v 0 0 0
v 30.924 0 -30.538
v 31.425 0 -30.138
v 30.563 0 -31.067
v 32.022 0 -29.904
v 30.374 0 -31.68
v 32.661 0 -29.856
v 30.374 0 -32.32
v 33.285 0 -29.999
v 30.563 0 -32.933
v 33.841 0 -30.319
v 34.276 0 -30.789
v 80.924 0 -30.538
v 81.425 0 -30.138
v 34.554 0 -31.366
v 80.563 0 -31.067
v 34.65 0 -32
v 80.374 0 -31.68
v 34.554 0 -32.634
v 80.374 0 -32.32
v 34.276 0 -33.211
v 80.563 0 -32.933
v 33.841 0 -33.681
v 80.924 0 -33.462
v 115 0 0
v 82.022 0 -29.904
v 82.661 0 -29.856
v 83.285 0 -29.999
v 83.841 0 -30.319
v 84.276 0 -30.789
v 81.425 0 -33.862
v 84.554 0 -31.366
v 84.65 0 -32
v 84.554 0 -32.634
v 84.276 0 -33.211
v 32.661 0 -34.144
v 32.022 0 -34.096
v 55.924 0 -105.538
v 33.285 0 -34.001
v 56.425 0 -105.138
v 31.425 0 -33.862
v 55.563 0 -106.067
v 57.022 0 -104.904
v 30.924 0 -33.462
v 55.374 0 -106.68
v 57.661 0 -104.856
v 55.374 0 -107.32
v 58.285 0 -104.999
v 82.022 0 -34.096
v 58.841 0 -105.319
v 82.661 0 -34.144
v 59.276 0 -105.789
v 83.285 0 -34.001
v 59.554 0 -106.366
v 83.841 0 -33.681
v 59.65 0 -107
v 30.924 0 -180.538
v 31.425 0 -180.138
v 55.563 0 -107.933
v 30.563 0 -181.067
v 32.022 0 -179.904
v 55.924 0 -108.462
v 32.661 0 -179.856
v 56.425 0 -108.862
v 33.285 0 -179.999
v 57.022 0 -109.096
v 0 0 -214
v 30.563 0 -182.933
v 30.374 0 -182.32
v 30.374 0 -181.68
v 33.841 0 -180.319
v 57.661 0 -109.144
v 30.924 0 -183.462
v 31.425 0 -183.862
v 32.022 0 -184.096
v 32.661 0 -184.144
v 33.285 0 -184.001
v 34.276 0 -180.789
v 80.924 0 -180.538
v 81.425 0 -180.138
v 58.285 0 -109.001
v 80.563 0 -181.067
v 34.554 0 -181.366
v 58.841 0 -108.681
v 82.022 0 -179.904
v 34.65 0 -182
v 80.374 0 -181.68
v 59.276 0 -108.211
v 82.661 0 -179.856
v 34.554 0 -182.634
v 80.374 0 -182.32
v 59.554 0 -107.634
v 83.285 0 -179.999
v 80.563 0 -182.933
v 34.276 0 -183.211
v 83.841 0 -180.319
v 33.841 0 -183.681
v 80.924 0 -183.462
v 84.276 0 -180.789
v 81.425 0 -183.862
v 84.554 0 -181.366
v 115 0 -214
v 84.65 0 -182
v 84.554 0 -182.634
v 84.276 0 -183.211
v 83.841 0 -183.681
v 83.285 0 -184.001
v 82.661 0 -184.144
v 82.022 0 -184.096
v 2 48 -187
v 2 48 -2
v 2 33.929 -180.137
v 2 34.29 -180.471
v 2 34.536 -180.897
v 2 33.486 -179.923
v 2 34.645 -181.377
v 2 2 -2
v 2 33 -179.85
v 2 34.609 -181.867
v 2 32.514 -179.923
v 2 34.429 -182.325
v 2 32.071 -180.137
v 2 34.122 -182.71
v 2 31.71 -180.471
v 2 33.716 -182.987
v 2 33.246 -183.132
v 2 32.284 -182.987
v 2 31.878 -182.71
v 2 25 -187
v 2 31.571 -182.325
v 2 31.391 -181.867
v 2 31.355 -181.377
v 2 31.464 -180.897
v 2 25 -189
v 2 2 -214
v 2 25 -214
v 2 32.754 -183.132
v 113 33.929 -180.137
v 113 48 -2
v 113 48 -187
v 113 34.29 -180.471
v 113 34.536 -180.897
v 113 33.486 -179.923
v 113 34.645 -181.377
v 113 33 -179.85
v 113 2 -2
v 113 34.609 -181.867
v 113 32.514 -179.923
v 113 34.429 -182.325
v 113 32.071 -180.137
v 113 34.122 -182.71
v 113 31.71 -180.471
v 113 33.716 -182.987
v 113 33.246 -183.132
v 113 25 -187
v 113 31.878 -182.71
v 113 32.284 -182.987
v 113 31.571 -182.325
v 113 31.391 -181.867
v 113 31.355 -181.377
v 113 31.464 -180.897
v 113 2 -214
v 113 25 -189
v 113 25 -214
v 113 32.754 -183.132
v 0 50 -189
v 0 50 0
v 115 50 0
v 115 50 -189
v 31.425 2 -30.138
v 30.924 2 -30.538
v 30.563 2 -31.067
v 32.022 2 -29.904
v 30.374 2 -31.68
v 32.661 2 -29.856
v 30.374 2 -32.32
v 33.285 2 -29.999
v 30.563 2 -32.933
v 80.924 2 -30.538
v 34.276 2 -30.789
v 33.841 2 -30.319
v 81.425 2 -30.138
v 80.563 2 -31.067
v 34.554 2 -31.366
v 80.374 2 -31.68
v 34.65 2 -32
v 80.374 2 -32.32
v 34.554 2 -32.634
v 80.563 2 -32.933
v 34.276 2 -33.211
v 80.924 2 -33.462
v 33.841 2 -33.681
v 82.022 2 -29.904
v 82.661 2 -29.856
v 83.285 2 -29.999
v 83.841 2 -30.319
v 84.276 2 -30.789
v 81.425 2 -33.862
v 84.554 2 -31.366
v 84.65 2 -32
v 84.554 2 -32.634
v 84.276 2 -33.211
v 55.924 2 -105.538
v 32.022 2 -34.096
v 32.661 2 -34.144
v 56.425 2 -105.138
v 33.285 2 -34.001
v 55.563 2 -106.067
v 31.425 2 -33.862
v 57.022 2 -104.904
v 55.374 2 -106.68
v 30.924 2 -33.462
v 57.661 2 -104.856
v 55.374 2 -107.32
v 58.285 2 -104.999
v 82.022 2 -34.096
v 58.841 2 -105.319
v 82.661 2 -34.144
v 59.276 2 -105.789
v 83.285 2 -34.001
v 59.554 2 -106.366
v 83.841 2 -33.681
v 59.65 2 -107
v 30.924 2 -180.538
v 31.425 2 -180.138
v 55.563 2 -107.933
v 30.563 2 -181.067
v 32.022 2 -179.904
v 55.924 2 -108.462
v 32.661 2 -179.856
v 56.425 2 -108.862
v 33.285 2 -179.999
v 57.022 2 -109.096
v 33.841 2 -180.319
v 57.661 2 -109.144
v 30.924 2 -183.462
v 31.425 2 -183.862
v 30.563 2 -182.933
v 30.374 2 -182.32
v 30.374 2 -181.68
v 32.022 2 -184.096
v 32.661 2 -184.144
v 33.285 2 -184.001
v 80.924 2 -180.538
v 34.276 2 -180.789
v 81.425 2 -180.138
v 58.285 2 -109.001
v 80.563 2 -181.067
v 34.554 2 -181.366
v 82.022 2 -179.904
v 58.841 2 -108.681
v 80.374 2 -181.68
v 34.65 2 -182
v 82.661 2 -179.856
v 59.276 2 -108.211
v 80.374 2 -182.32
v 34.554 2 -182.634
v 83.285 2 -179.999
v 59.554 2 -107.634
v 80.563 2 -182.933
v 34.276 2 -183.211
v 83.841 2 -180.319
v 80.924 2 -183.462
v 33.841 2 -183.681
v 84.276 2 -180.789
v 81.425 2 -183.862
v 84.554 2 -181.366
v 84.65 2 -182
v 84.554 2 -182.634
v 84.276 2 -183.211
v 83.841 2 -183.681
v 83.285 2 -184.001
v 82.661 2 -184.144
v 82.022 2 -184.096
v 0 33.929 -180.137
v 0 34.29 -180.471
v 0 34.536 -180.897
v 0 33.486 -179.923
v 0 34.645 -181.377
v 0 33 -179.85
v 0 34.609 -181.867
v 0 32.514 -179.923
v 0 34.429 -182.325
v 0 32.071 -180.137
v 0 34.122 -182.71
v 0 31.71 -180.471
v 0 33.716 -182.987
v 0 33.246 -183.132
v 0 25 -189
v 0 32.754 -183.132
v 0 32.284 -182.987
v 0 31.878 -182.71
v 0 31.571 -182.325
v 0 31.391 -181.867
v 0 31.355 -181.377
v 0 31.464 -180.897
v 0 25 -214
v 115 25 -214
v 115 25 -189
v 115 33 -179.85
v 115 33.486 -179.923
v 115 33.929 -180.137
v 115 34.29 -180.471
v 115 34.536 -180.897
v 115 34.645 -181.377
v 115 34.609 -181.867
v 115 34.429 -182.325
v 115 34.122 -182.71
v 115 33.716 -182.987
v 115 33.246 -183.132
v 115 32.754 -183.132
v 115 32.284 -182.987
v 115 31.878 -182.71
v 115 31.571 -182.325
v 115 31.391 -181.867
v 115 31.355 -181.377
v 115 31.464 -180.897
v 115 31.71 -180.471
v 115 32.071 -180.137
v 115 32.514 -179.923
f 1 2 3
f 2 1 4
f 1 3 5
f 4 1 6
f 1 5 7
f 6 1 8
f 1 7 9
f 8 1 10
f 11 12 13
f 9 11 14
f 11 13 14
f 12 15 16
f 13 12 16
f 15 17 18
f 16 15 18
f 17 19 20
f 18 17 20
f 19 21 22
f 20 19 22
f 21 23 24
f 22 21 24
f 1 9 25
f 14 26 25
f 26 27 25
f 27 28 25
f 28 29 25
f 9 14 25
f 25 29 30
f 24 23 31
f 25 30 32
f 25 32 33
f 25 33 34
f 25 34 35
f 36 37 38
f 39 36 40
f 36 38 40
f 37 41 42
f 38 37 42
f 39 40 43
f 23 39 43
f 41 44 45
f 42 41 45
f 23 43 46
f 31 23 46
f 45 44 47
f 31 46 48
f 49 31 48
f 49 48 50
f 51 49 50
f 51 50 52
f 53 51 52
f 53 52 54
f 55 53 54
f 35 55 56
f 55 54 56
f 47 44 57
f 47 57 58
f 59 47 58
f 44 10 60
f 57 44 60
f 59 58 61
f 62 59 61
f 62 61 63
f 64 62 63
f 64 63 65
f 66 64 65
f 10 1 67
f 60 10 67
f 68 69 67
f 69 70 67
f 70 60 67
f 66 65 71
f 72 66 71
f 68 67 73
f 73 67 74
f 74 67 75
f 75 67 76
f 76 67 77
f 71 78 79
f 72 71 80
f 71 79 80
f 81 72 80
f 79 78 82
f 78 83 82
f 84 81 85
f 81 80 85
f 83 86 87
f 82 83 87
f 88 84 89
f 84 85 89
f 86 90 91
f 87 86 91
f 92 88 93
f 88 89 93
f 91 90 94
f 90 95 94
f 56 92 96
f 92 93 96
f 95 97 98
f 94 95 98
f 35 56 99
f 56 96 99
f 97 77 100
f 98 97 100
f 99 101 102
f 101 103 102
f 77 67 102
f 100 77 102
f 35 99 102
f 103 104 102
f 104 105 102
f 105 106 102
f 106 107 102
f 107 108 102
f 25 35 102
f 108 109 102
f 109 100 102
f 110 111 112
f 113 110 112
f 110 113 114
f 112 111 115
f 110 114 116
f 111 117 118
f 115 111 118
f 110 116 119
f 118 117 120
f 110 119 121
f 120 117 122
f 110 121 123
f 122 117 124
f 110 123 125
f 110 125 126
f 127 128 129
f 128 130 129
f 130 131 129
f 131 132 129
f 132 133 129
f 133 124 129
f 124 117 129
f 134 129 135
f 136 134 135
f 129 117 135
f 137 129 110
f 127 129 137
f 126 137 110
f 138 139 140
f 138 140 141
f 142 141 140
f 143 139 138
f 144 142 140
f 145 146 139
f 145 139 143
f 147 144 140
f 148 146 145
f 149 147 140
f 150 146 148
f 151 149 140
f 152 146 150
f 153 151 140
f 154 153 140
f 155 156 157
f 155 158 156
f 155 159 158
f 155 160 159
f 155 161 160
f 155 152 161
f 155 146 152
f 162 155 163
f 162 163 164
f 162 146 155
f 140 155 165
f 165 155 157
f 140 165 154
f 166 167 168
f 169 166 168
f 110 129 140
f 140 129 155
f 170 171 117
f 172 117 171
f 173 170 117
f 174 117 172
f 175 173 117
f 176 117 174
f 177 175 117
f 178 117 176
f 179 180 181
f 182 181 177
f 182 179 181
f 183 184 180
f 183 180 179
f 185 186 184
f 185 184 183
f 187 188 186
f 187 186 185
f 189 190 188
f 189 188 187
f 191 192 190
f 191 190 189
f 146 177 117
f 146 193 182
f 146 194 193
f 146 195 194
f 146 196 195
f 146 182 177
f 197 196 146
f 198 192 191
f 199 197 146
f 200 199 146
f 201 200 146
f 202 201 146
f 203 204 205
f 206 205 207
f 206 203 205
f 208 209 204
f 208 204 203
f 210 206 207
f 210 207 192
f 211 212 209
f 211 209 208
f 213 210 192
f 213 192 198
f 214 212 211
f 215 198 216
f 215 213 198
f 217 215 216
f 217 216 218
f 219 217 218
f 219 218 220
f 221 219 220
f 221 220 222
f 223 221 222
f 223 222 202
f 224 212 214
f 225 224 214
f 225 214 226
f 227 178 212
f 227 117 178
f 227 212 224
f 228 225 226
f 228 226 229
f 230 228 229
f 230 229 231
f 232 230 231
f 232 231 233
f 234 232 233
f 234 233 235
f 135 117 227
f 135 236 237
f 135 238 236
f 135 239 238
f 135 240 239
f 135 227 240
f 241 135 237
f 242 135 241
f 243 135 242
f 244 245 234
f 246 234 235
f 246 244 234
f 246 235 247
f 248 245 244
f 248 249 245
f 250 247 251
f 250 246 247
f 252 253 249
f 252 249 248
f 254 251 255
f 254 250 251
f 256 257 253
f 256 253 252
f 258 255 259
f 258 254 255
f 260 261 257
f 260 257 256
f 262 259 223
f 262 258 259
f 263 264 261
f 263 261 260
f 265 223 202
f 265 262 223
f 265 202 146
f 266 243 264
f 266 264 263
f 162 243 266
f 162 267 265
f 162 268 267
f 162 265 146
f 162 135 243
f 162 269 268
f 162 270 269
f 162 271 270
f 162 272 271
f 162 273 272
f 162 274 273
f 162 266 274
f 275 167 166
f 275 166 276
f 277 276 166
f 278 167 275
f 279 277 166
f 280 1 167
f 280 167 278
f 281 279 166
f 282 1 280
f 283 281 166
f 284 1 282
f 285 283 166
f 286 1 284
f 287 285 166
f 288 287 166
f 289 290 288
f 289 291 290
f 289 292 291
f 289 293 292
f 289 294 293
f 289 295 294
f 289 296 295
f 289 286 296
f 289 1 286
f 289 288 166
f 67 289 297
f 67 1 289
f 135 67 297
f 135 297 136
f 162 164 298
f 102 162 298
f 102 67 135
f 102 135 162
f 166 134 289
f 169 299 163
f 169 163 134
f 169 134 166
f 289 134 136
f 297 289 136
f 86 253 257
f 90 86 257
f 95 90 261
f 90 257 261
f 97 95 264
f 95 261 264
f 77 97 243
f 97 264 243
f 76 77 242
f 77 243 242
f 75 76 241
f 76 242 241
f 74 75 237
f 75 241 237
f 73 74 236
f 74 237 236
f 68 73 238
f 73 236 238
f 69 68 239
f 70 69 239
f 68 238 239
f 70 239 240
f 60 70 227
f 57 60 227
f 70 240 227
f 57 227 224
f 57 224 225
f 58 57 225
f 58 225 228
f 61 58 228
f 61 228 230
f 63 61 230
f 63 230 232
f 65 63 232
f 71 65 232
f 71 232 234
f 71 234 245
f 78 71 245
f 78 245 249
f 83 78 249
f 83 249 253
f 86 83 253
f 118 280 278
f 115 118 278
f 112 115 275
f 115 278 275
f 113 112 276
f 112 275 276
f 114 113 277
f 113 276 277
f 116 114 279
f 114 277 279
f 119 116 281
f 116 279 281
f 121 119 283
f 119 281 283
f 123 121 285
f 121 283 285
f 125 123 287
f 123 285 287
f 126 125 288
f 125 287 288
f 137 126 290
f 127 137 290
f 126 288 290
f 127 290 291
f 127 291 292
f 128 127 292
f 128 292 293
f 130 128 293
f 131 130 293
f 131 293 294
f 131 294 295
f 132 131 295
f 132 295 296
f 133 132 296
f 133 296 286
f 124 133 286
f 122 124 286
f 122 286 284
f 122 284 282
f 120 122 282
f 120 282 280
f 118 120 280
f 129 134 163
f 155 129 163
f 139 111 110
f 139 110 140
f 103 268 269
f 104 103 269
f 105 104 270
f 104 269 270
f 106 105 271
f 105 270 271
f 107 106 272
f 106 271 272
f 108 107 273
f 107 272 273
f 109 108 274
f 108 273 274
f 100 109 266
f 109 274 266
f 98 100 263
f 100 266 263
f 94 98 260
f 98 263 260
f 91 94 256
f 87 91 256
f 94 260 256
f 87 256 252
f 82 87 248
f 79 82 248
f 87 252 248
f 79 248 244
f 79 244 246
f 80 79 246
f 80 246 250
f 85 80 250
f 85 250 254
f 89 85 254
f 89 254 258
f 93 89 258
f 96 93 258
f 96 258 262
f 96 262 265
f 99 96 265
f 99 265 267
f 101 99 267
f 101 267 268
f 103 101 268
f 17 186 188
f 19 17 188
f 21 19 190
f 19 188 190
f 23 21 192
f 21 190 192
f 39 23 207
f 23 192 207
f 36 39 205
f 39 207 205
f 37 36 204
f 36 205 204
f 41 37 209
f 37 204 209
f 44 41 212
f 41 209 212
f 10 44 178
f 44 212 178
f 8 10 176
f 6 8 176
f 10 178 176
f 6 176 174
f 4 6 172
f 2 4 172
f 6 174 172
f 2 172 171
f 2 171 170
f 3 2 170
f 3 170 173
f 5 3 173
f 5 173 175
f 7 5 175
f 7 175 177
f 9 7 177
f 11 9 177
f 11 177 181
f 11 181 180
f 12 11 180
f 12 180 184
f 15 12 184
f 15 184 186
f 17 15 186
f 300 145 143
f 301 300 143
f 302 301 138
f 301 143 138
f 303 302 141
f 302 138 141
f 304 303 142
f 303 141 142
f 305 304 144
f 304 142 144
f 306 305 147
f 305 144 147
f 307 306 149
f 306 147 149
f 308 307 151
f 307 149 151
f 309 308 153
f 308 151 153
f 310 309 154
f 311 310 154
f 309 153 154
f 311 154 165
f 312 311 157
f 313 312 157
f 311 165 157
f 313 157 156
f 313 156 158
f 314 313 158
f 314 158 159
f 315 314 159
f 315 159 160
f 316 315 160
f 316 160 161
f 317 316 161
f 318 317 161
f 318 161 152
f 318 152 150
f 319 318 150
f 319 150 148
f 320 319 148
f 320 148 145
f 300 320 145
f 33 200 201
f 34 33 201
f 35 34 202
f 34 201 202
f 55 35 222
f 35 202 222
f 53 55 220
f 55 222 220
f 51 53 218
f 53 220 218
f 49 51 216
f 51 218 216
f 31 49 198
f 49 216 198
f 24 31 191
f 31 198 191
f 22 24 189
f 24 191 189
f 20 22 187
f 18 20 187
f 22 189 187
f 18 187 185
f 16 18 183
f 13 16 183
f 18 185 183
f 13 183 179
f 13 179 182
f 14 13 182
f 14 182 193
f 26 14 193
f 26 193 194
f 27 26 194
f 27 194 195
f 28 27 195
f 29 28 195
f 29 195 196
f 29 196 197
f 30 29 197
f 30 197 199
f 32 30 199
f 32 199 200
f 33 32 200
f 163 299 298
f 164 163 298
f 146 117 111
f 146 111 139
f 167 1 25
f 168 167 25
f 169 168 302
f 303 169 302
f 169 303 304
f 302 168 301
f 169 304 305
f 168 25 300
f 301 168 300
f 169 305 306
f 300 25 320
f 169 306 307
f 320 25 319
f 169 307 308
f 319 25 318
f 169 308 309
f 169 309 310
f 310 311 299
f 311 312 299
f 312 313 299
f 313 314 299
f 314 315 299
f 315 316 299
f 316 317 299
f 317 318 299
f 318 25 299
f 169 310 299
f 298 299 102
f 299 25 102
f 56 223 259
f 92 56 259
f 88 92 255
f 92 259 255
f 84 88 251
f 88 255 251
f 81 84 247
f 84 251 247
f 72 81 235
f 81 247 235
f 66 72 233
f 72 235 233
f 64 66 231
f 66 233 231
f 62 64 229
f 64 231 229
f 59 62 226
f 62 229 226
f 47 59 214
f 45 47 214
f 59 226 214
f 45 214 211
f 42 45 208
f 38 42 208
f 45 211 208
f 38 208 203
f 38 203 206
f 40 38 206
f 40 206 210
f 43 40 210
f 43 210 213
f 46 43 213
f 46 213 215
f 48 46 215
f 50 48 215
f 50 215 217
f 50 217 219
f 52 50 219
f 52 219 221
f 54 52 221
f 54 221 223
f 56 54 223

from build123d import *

# Parameters (mm, degrees)
SKETCH1_W                = 115
SKETCH1_H                = 214
BOSS_EXTRUDE1_DEPTH      = 50
SKETCH4_W                = 25
SKETCH4_H                = 25
CUT_EXTRUDE1_DEPTH       = 249.034271825
SHELL1_START             = 2
SHELL1_OUTLINE_W         = 111
SHELL1_OUTLINE_H         = 185
SHELL1_DEPTH             = 46
SHELL1_2_OUTLINE_W       = 111
SHELL1_2_OUTLINE_H       = 27
SHELL1_2_DEPTH           = 23
M4_CLEARANCE_HOLE1_D     = 4.3
M4_CLEARANCE_HOLE1_DEPTH = 4
M4_CLEARANCE_HOLE1_TIP   = 1.291850331
TAP_DRILL_FOR_M4_TAP1_D  = 3.3


# Read off the part's stored shape, not the designer's step: Shell1
with BuildPart() as part:
    # Sketch1 → Boss-Extrude1 (new body)
    with BuildSketch(Plane(origin=(0, 0, 0), x_dir=(1, 0, 0), z_dir=(0, 1, 0))):
        with Locations((57.5, 107)):
            Rectangle(SKETCH1_W, SKETCH1_H)
    extrude(amount=BOSS_EXTRUDE1_DEPTH)

    # Sketch4 → Cut-Extrude1 (cut, through all)
    with BuildSketch(Plane(origin=(115, 0, 0), x_dir=(0, 0, -1), z_dir=(1, 0, 0))):
        with Locations((201.5, 37.5)):
            Rectangle(SKETCH4_W, SKETCH4_H)
    extrude(amount=-CUT_EXTRUDE1_DEPTH, mode=Mode.SUBTRACT)

    # Shell1 outline → Shell1 (cut)
    with BuildSketch(Plane(origin=(0, 0, 0), x_dir=(1, 0, 0), z_dir=(0, 1, 0)).offset(SHELL1_START)):
        with Locations((57.5, 94.5)):
            Rectangle(SHELL1_OUTLINE_W, SHELL1_OUTLINE_H)
    extrude(amount=SHELL1_DEPTH, mode=Mode.SUBTRACT)

    # Shell1 2 outline → Shell1 2 (cut)
    with BuildSketch(Plane(origin=(0, 0, 0), x_dir=(1, 0, 0), z_dir=(0, 1, 0)).offset(SHELL1_START)):
        with Locations((57.5, 200.5)):
            Rectangle(SHELL1_2_OUTLINE_W, SHELL1_2_OUTLINE_H)
    extrude(amount=SHELL1_2_DEPTH, mode=Mode.SUBTRACT)

    # M4 Clearance Hole1
    with Locations(Plane(origin=(0, 0, 0), x_dir=(-1, 0, 0), z_dir=(0, -1, 0))):
        with Locations((-32.5, 32), (-57.5, 107), (-32.5, 182), (-82.5, 32), (-82.5, 182)):
            Hole(M4_CLEARANCE_HOLE1_D / 2, depth=M4_CLEARANCE_HOLE1_DEPTH)
            with Locations((0, 0, -(M4_CLEARANCE_HOLE1_DEPTH + M4_CLEARANCE_HOLE1_TIP / 2))):  # 118° drill point
                Cone(0, M4_CLEARANCE_HOLE1_D / 2, M4_CLEARANCE_HOLE1_TIP, mode=Mode.SUBTRACT)

    # Tap Drill for M4 Tap1 (through all)
    with Locations(Plane(origin=(115, 0, 0), x_dir=(0, 0, -1), z_dir=(1, 0, 0))):
        with Locations((181.5, 33)):
            Hole(TAP_DRILL_FOR_M4_TAP1_D / 2)


solid = part.part
